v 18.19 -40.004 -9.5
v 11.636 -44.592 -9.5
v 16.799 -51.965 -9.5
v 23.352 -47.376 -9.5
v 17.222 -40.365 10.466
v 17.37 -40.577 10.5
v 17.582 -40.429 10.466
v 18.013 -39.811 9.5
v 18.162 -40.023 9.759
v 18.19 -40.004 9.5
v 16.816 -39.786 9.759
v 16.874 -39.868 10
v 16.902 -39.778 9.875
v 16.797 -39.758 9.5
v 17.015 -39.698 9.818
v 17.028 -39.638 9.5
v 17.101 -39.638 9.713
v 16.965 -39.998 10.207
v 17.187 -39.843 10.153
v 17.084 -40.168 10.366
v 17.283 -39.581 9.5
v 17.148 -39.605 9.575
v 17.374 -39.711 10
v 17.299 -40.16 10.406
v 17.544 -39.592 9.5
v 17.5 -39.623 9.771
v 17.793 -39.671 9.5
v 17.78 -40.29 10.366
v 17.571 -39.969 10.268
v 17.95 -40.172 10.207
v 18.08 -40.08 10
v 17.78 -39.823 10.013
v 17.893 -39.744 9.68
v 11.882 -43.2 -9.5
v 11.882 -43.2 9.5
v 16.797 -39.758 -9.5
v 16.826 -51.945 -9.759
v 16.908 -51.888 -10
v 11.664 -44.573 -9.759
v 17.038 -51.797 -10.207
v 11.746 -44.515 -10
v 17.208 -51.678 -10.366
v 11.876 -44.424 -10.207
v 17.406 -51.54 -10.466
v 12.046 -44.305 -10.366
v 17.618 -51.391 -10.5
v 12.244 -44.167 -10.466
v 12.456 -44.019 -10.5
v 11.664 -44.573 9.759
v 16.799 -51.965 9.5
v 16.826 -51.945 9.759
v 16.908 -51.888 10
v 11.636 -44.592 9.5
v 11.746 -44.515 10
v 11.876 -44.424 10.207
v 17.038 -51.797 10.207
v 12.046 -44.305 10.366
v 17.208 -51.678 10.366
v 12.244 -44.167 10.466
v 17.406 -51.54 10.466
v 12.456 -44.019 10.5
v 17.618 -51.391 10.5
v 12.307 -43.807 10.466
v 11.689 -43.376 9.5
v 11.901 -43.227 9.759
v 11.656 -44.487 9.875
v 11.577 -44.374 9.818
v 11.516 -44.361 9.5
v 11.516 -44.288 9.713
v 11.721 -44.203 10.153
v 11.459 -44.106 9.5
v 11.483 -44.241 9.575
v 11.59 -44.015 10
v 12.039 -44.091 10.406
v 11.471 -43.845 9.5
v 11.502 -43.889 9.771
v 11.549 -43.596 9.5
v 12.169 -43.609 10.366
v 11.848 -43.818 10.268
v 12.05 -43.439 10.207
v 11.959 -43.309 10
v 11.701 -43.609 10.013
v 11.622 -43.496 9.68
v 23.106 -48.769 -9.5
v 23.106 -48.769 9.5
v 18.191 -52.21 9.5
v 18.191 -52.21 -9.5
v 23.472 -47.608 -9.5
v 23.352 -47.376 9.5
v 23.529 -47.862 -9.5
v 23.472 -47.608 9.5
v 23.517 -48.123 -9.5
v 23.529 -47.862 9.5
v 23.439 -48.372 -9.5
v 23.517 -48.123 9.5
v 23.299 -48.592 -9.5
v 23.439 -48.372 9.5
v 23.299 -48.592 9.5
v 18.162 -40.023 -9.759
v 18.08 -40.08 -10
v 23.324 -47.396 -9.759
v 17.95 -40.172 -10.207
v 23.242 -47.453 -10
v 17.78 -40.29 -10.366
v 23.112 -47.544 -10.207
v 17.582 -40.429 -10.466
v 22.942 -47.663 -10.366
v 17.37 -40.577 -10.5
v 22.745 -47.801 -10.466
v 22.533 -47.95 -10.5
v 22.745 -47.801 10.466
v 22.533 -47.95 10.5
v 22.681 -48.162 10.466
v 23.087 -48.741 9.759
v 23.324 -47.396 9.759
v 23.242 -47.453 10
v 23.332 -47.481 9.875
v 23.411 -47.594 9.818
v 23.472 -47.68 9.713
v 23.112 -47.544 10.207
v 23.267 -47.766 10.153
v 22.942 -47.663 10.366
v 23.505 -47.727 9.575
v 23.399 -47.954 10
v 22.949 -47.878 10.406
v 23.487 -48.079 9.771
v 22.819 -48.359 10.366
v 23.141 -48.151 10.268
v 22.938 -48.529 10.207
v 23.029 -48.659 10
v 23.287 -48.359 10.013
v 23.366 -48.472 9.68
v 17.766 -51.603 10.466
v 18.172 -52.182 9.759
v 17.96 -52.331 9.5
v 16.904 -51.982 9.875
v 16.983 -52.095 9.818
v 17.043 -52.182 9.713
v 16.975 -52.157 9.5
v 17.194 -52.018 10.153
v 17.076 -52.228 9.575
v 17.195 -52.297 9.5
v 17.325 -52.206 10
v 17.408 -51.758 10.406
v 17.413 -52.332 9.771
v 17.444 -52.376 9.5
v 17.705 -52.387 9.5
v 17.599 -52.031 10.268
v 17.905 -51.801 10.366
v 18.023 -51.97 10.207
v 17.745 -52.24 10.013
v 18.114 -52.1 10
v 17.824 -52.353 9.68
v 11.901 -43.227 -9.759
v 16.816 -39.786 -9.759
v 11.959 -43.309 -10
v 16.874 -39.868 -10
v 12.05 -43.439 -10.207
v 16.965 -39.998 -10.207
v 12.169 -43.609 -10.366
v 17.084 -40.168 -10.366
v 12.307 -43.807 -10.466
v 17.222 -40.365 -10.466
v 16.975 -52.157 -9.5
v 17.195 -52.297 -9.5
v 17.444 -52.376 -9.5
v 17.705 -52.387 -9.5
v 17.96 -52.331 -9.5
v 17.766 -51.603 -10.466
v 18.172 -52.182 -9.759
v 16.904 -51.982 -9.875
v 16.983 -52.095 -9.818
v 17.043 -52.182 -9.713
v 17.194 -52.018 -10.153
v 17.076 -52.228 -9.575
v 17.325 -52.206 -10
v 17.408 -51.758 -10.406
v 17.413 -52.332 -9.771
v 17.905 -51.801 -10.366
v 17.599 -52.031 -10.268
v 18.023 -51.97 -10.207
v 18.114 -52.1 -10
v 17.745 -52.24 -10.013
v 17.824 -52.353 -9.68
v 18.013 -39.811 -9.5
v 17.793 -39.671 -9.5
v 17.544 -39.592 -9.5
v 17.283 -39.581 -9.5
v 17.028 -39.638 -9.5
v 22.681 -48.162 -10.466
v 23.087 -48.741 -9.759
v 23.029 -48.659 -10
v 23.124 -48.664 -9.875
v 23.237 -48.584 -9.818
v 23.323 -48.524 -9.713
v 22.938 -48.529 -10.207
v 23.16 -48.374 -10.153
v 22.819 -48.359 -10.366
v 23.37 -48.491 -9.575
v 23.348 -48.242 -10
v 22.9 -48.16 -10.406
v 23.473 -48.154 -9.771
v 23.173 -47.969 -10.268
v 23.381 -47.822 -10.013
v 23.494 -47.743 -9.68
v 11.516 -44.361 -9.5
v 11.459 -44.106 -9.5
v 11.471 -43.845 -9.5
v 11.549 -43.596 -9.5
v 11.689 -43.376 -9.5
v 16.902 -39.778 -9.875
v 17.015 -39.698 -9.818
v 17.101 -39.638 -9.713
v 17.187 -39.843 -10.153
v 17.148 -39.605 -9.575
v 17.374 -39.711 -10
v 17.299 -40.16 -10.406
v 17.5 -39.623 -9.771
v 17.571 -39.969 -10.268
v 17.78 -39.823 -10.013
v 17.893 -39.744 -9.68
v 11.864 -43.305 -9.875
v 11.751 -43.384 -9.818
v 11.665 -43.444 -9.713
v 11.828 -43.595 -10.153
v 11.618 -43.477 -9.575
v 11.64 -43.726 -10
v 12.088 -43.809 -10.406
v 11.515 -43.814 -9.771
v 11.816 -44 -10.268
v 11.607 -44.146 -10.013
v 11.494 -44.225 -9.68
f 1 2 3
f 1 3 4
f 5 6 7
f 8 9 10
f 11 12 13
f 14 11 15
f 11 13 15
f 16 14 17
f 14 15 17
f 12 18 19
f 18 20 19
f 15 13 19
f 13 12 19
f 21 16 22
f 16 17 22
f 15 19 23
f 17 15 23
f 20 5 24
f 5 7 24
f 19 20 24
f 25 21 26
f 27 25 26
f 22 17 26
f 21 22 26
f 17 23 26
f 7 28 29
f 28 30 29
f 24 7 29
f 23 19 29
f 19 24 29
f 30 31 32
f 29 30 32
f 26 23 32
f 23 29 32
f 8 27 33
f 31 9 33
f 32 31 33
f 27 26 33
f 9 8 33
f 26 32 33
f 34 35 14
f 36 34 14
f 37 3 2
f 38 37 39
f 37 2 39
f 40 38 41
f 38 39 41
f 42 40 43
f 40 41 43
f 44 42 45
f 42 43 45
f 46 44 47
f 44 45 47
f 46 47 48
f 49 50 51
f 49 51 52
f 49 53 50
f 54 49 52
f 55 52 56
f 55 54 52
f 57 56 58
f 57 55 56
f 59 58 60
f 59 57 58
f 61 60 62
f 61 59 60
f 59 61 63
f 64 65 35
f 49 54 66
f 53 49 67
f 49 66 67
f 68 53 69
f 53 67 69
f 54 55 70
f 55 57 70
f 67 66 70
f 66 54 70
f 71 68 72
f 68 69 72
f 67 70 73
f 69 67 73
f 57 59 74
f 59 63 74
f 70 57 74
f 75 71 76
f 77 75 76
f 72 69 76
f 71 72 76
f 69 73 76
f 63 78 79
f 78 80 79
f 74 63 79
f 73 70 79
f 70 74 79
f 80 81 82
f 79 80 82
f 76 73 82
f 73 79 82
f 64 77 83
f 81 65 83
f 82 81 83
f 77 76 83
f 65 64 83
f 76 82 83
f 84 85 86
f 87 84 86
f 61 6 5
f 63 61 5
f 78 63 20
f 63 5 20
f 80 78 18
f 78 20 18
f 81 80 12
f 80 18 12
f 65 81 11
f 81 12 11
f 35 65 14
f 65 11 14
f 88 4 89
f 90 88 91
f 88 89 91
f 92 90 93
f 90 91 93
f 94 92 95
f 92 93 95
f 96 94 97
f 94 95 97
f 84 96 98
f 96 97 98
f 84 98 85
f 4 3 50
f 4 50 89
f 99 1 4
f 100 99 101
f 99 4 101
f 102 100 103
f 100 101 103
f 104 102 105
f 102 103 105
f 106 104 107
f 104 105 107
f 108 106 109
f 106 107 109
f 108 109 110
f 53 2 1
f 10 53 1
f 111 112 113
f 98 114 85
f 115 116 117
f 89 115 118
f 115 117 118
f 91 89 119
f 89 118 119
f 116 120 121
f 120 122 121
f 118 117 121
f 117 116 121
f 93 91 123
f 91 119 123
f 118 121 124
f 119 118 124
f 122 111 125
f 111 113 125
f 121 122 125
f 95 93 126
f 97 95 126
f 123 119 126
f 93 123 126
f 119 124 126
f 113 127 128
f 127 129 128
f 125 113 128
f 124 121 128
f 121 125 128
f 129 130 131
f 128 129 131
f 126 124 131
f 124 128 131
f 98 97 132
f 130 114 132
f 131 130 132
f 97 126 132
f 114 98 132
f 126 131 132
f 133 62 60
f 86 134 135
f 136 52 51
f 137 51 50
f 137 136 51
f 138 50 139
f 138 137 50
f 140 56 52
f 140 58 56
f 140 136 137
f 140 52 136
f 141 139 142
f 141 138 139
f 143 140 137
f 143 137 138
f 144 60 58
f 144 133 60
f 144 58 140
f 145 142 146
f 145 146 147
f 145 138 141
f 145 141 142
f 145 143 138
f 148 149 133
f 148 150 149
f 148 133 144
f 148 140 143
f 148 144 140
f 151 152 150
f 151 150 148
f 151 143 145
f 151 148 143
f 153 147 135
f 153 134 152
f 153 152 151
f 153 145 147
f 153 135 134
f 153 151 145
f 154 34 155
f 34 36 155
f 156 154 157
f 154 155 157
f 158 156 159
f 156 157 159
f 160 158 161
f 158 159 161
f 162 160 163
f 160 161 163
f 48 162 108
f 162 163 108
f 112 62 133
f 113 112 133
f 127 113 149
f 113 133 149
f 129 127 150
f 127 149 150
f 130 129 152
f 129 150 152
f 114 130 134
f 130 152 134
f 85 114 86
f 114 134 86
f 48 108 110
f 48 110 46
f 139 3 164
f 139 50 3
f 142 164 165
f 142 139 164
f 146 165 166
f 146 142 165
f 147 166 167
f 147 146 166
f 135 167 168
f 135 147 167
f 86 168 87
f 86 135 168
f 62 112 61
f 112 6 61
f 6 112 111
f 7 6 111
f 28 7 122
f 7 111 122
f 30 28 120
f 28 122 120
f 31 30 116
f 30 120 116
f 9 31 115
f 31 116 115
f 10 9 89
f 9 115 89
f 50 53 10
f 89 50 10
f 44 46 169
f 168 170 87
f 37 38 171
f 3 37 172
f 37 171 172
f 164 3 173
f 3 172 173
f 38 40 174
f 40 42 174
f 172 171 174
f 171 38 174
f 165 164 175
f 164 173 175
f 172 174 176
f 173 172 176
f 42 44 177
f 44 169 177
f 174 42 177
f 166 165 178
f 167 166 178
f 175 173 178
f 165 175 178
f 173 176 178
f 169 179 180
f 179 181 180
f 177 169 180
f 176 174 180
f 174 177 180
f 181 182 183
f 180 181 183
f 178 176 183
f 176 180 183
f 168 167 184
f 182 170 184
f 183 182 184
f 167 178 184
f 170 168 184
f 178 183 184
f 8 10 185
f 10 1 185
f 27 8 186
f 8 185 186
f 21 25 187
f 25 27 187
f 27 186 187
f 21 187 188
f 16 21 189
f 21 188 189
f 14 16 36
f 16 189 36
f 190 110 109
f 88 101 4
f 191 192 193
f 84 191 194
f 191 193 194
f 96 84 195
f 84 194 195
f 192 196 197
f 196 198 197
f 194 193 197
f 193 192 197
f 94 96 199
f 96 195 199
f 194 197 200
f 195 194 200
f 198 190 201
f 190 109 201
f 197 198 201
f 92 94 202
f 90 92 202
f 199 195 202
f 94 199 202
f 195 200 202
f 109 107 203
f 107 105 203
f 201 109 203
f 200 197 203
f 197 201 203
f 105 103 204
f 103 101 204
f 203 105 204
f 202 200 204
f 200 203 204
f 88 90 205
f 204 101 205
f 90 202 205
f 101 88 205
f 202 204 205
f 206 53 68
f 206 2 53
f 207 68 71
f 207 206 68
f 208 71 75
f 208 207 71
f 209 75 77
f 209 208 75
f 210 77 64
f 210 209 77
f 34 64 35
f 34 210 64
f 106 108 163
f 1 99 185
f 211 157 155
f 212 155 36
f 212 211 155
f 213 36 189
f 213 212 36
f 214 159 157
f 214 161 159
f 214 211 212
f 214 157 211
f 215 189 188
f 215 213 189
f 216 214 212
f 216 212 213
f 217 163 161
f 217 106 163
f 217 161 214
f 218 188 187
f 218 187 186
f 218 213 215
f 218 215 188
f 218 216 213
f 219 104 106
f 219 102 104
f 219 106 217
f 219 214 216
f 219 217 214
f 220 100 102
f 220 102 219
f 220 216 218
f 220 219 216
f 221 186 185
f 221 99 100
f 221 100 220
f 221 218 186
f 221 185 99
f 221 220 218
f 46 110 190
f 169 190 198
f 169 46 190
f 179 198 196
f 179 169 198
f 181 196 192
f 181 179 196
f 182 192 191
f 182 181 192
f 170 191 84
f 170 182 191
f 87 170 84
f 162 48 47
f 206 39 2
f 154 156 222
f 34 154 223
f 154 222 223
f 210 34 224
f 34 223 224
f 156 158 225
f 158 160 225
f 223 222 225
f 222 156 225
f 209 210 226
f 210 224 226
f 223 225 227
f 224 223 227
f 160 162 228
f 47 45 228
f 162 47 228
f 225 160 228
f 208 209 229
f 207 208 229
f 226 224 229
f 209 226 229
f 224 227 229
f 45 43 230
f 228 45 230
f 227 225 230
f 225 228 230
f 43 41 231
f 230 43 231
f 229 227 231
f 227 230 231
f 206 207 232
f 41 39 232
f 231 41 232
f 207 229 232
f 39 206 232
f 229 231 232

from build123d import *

# Parameters (mm, degrees)
BASE_EXTRUDE_DEPTH = 10.5
FILLET1_R          = 1
SHELL1_START       = 43.20219293
SHELL1_OUTLINE_W   = 8
SHELL1_OUTLINE_H   = 19
SHELL1_DEPTH       = 9


# Read off the part's stored shape, not the designer's step: Shell1
with BuildPart() as part:
    # Sketch1 → Base-Extrude (new, symmetric)
    with BuildSketch(Plane.XY):
        Polygon((17.372143532, -52.78377934), (11.062802732, -43.773106853), (17.616019086, -39.184495362), (23.925359886, -48.195167849), align=None)
    extrude(amount=BASE_EXTRUDE_DEPTH, both=True)

    # Fillet1
    fillet1_edges = [part.edges().sort_by_distance(p)[0] for p in [
        (20.648751709, -50.489473594, 10.5),
        (20.770689486, -43.689831605, 10.5),
        (14.339410909, -41.478801107, 10.5),
        (20.770689486, -43.689831605, -10.5),
        (20.648751709, -50.489473594, -10.5),
        (14.217473132, -48.278443096, -10.5),
        (14.339410909, -41.478801107, -10.5),
        (14.217473132, -48.278443096, 10.5),
        (17.616019086, -39.184495362, 0),
        (23.925359886, -48.195167849, 0),
        (17.372143532, -52.78377934, 0),
        (11.062802732, -43.773106853, 0),
    ]]
    fillet(fillet1_edges, radius=FILLET1_R)

    # Shell1 outline → Shell1 (cut)
    with BuildSketch(Plane(origin=(0, 0, 0), x_dir=(0.8191520442889926, 0.5735764363510448, 0), z_dir=(0.5735764363510448, -0.8191520442889927, 0)).offset(SHELL1_START)):
        with Locations((-12.045105163, 0)):
            Rectangle(SHELL1_OUTLINE_W, SHELL1_OUTLINE_H)
    extrude(amount=SHELL1_DEPTH, mode=Mode.SUBTRACT)


solid = part.part
